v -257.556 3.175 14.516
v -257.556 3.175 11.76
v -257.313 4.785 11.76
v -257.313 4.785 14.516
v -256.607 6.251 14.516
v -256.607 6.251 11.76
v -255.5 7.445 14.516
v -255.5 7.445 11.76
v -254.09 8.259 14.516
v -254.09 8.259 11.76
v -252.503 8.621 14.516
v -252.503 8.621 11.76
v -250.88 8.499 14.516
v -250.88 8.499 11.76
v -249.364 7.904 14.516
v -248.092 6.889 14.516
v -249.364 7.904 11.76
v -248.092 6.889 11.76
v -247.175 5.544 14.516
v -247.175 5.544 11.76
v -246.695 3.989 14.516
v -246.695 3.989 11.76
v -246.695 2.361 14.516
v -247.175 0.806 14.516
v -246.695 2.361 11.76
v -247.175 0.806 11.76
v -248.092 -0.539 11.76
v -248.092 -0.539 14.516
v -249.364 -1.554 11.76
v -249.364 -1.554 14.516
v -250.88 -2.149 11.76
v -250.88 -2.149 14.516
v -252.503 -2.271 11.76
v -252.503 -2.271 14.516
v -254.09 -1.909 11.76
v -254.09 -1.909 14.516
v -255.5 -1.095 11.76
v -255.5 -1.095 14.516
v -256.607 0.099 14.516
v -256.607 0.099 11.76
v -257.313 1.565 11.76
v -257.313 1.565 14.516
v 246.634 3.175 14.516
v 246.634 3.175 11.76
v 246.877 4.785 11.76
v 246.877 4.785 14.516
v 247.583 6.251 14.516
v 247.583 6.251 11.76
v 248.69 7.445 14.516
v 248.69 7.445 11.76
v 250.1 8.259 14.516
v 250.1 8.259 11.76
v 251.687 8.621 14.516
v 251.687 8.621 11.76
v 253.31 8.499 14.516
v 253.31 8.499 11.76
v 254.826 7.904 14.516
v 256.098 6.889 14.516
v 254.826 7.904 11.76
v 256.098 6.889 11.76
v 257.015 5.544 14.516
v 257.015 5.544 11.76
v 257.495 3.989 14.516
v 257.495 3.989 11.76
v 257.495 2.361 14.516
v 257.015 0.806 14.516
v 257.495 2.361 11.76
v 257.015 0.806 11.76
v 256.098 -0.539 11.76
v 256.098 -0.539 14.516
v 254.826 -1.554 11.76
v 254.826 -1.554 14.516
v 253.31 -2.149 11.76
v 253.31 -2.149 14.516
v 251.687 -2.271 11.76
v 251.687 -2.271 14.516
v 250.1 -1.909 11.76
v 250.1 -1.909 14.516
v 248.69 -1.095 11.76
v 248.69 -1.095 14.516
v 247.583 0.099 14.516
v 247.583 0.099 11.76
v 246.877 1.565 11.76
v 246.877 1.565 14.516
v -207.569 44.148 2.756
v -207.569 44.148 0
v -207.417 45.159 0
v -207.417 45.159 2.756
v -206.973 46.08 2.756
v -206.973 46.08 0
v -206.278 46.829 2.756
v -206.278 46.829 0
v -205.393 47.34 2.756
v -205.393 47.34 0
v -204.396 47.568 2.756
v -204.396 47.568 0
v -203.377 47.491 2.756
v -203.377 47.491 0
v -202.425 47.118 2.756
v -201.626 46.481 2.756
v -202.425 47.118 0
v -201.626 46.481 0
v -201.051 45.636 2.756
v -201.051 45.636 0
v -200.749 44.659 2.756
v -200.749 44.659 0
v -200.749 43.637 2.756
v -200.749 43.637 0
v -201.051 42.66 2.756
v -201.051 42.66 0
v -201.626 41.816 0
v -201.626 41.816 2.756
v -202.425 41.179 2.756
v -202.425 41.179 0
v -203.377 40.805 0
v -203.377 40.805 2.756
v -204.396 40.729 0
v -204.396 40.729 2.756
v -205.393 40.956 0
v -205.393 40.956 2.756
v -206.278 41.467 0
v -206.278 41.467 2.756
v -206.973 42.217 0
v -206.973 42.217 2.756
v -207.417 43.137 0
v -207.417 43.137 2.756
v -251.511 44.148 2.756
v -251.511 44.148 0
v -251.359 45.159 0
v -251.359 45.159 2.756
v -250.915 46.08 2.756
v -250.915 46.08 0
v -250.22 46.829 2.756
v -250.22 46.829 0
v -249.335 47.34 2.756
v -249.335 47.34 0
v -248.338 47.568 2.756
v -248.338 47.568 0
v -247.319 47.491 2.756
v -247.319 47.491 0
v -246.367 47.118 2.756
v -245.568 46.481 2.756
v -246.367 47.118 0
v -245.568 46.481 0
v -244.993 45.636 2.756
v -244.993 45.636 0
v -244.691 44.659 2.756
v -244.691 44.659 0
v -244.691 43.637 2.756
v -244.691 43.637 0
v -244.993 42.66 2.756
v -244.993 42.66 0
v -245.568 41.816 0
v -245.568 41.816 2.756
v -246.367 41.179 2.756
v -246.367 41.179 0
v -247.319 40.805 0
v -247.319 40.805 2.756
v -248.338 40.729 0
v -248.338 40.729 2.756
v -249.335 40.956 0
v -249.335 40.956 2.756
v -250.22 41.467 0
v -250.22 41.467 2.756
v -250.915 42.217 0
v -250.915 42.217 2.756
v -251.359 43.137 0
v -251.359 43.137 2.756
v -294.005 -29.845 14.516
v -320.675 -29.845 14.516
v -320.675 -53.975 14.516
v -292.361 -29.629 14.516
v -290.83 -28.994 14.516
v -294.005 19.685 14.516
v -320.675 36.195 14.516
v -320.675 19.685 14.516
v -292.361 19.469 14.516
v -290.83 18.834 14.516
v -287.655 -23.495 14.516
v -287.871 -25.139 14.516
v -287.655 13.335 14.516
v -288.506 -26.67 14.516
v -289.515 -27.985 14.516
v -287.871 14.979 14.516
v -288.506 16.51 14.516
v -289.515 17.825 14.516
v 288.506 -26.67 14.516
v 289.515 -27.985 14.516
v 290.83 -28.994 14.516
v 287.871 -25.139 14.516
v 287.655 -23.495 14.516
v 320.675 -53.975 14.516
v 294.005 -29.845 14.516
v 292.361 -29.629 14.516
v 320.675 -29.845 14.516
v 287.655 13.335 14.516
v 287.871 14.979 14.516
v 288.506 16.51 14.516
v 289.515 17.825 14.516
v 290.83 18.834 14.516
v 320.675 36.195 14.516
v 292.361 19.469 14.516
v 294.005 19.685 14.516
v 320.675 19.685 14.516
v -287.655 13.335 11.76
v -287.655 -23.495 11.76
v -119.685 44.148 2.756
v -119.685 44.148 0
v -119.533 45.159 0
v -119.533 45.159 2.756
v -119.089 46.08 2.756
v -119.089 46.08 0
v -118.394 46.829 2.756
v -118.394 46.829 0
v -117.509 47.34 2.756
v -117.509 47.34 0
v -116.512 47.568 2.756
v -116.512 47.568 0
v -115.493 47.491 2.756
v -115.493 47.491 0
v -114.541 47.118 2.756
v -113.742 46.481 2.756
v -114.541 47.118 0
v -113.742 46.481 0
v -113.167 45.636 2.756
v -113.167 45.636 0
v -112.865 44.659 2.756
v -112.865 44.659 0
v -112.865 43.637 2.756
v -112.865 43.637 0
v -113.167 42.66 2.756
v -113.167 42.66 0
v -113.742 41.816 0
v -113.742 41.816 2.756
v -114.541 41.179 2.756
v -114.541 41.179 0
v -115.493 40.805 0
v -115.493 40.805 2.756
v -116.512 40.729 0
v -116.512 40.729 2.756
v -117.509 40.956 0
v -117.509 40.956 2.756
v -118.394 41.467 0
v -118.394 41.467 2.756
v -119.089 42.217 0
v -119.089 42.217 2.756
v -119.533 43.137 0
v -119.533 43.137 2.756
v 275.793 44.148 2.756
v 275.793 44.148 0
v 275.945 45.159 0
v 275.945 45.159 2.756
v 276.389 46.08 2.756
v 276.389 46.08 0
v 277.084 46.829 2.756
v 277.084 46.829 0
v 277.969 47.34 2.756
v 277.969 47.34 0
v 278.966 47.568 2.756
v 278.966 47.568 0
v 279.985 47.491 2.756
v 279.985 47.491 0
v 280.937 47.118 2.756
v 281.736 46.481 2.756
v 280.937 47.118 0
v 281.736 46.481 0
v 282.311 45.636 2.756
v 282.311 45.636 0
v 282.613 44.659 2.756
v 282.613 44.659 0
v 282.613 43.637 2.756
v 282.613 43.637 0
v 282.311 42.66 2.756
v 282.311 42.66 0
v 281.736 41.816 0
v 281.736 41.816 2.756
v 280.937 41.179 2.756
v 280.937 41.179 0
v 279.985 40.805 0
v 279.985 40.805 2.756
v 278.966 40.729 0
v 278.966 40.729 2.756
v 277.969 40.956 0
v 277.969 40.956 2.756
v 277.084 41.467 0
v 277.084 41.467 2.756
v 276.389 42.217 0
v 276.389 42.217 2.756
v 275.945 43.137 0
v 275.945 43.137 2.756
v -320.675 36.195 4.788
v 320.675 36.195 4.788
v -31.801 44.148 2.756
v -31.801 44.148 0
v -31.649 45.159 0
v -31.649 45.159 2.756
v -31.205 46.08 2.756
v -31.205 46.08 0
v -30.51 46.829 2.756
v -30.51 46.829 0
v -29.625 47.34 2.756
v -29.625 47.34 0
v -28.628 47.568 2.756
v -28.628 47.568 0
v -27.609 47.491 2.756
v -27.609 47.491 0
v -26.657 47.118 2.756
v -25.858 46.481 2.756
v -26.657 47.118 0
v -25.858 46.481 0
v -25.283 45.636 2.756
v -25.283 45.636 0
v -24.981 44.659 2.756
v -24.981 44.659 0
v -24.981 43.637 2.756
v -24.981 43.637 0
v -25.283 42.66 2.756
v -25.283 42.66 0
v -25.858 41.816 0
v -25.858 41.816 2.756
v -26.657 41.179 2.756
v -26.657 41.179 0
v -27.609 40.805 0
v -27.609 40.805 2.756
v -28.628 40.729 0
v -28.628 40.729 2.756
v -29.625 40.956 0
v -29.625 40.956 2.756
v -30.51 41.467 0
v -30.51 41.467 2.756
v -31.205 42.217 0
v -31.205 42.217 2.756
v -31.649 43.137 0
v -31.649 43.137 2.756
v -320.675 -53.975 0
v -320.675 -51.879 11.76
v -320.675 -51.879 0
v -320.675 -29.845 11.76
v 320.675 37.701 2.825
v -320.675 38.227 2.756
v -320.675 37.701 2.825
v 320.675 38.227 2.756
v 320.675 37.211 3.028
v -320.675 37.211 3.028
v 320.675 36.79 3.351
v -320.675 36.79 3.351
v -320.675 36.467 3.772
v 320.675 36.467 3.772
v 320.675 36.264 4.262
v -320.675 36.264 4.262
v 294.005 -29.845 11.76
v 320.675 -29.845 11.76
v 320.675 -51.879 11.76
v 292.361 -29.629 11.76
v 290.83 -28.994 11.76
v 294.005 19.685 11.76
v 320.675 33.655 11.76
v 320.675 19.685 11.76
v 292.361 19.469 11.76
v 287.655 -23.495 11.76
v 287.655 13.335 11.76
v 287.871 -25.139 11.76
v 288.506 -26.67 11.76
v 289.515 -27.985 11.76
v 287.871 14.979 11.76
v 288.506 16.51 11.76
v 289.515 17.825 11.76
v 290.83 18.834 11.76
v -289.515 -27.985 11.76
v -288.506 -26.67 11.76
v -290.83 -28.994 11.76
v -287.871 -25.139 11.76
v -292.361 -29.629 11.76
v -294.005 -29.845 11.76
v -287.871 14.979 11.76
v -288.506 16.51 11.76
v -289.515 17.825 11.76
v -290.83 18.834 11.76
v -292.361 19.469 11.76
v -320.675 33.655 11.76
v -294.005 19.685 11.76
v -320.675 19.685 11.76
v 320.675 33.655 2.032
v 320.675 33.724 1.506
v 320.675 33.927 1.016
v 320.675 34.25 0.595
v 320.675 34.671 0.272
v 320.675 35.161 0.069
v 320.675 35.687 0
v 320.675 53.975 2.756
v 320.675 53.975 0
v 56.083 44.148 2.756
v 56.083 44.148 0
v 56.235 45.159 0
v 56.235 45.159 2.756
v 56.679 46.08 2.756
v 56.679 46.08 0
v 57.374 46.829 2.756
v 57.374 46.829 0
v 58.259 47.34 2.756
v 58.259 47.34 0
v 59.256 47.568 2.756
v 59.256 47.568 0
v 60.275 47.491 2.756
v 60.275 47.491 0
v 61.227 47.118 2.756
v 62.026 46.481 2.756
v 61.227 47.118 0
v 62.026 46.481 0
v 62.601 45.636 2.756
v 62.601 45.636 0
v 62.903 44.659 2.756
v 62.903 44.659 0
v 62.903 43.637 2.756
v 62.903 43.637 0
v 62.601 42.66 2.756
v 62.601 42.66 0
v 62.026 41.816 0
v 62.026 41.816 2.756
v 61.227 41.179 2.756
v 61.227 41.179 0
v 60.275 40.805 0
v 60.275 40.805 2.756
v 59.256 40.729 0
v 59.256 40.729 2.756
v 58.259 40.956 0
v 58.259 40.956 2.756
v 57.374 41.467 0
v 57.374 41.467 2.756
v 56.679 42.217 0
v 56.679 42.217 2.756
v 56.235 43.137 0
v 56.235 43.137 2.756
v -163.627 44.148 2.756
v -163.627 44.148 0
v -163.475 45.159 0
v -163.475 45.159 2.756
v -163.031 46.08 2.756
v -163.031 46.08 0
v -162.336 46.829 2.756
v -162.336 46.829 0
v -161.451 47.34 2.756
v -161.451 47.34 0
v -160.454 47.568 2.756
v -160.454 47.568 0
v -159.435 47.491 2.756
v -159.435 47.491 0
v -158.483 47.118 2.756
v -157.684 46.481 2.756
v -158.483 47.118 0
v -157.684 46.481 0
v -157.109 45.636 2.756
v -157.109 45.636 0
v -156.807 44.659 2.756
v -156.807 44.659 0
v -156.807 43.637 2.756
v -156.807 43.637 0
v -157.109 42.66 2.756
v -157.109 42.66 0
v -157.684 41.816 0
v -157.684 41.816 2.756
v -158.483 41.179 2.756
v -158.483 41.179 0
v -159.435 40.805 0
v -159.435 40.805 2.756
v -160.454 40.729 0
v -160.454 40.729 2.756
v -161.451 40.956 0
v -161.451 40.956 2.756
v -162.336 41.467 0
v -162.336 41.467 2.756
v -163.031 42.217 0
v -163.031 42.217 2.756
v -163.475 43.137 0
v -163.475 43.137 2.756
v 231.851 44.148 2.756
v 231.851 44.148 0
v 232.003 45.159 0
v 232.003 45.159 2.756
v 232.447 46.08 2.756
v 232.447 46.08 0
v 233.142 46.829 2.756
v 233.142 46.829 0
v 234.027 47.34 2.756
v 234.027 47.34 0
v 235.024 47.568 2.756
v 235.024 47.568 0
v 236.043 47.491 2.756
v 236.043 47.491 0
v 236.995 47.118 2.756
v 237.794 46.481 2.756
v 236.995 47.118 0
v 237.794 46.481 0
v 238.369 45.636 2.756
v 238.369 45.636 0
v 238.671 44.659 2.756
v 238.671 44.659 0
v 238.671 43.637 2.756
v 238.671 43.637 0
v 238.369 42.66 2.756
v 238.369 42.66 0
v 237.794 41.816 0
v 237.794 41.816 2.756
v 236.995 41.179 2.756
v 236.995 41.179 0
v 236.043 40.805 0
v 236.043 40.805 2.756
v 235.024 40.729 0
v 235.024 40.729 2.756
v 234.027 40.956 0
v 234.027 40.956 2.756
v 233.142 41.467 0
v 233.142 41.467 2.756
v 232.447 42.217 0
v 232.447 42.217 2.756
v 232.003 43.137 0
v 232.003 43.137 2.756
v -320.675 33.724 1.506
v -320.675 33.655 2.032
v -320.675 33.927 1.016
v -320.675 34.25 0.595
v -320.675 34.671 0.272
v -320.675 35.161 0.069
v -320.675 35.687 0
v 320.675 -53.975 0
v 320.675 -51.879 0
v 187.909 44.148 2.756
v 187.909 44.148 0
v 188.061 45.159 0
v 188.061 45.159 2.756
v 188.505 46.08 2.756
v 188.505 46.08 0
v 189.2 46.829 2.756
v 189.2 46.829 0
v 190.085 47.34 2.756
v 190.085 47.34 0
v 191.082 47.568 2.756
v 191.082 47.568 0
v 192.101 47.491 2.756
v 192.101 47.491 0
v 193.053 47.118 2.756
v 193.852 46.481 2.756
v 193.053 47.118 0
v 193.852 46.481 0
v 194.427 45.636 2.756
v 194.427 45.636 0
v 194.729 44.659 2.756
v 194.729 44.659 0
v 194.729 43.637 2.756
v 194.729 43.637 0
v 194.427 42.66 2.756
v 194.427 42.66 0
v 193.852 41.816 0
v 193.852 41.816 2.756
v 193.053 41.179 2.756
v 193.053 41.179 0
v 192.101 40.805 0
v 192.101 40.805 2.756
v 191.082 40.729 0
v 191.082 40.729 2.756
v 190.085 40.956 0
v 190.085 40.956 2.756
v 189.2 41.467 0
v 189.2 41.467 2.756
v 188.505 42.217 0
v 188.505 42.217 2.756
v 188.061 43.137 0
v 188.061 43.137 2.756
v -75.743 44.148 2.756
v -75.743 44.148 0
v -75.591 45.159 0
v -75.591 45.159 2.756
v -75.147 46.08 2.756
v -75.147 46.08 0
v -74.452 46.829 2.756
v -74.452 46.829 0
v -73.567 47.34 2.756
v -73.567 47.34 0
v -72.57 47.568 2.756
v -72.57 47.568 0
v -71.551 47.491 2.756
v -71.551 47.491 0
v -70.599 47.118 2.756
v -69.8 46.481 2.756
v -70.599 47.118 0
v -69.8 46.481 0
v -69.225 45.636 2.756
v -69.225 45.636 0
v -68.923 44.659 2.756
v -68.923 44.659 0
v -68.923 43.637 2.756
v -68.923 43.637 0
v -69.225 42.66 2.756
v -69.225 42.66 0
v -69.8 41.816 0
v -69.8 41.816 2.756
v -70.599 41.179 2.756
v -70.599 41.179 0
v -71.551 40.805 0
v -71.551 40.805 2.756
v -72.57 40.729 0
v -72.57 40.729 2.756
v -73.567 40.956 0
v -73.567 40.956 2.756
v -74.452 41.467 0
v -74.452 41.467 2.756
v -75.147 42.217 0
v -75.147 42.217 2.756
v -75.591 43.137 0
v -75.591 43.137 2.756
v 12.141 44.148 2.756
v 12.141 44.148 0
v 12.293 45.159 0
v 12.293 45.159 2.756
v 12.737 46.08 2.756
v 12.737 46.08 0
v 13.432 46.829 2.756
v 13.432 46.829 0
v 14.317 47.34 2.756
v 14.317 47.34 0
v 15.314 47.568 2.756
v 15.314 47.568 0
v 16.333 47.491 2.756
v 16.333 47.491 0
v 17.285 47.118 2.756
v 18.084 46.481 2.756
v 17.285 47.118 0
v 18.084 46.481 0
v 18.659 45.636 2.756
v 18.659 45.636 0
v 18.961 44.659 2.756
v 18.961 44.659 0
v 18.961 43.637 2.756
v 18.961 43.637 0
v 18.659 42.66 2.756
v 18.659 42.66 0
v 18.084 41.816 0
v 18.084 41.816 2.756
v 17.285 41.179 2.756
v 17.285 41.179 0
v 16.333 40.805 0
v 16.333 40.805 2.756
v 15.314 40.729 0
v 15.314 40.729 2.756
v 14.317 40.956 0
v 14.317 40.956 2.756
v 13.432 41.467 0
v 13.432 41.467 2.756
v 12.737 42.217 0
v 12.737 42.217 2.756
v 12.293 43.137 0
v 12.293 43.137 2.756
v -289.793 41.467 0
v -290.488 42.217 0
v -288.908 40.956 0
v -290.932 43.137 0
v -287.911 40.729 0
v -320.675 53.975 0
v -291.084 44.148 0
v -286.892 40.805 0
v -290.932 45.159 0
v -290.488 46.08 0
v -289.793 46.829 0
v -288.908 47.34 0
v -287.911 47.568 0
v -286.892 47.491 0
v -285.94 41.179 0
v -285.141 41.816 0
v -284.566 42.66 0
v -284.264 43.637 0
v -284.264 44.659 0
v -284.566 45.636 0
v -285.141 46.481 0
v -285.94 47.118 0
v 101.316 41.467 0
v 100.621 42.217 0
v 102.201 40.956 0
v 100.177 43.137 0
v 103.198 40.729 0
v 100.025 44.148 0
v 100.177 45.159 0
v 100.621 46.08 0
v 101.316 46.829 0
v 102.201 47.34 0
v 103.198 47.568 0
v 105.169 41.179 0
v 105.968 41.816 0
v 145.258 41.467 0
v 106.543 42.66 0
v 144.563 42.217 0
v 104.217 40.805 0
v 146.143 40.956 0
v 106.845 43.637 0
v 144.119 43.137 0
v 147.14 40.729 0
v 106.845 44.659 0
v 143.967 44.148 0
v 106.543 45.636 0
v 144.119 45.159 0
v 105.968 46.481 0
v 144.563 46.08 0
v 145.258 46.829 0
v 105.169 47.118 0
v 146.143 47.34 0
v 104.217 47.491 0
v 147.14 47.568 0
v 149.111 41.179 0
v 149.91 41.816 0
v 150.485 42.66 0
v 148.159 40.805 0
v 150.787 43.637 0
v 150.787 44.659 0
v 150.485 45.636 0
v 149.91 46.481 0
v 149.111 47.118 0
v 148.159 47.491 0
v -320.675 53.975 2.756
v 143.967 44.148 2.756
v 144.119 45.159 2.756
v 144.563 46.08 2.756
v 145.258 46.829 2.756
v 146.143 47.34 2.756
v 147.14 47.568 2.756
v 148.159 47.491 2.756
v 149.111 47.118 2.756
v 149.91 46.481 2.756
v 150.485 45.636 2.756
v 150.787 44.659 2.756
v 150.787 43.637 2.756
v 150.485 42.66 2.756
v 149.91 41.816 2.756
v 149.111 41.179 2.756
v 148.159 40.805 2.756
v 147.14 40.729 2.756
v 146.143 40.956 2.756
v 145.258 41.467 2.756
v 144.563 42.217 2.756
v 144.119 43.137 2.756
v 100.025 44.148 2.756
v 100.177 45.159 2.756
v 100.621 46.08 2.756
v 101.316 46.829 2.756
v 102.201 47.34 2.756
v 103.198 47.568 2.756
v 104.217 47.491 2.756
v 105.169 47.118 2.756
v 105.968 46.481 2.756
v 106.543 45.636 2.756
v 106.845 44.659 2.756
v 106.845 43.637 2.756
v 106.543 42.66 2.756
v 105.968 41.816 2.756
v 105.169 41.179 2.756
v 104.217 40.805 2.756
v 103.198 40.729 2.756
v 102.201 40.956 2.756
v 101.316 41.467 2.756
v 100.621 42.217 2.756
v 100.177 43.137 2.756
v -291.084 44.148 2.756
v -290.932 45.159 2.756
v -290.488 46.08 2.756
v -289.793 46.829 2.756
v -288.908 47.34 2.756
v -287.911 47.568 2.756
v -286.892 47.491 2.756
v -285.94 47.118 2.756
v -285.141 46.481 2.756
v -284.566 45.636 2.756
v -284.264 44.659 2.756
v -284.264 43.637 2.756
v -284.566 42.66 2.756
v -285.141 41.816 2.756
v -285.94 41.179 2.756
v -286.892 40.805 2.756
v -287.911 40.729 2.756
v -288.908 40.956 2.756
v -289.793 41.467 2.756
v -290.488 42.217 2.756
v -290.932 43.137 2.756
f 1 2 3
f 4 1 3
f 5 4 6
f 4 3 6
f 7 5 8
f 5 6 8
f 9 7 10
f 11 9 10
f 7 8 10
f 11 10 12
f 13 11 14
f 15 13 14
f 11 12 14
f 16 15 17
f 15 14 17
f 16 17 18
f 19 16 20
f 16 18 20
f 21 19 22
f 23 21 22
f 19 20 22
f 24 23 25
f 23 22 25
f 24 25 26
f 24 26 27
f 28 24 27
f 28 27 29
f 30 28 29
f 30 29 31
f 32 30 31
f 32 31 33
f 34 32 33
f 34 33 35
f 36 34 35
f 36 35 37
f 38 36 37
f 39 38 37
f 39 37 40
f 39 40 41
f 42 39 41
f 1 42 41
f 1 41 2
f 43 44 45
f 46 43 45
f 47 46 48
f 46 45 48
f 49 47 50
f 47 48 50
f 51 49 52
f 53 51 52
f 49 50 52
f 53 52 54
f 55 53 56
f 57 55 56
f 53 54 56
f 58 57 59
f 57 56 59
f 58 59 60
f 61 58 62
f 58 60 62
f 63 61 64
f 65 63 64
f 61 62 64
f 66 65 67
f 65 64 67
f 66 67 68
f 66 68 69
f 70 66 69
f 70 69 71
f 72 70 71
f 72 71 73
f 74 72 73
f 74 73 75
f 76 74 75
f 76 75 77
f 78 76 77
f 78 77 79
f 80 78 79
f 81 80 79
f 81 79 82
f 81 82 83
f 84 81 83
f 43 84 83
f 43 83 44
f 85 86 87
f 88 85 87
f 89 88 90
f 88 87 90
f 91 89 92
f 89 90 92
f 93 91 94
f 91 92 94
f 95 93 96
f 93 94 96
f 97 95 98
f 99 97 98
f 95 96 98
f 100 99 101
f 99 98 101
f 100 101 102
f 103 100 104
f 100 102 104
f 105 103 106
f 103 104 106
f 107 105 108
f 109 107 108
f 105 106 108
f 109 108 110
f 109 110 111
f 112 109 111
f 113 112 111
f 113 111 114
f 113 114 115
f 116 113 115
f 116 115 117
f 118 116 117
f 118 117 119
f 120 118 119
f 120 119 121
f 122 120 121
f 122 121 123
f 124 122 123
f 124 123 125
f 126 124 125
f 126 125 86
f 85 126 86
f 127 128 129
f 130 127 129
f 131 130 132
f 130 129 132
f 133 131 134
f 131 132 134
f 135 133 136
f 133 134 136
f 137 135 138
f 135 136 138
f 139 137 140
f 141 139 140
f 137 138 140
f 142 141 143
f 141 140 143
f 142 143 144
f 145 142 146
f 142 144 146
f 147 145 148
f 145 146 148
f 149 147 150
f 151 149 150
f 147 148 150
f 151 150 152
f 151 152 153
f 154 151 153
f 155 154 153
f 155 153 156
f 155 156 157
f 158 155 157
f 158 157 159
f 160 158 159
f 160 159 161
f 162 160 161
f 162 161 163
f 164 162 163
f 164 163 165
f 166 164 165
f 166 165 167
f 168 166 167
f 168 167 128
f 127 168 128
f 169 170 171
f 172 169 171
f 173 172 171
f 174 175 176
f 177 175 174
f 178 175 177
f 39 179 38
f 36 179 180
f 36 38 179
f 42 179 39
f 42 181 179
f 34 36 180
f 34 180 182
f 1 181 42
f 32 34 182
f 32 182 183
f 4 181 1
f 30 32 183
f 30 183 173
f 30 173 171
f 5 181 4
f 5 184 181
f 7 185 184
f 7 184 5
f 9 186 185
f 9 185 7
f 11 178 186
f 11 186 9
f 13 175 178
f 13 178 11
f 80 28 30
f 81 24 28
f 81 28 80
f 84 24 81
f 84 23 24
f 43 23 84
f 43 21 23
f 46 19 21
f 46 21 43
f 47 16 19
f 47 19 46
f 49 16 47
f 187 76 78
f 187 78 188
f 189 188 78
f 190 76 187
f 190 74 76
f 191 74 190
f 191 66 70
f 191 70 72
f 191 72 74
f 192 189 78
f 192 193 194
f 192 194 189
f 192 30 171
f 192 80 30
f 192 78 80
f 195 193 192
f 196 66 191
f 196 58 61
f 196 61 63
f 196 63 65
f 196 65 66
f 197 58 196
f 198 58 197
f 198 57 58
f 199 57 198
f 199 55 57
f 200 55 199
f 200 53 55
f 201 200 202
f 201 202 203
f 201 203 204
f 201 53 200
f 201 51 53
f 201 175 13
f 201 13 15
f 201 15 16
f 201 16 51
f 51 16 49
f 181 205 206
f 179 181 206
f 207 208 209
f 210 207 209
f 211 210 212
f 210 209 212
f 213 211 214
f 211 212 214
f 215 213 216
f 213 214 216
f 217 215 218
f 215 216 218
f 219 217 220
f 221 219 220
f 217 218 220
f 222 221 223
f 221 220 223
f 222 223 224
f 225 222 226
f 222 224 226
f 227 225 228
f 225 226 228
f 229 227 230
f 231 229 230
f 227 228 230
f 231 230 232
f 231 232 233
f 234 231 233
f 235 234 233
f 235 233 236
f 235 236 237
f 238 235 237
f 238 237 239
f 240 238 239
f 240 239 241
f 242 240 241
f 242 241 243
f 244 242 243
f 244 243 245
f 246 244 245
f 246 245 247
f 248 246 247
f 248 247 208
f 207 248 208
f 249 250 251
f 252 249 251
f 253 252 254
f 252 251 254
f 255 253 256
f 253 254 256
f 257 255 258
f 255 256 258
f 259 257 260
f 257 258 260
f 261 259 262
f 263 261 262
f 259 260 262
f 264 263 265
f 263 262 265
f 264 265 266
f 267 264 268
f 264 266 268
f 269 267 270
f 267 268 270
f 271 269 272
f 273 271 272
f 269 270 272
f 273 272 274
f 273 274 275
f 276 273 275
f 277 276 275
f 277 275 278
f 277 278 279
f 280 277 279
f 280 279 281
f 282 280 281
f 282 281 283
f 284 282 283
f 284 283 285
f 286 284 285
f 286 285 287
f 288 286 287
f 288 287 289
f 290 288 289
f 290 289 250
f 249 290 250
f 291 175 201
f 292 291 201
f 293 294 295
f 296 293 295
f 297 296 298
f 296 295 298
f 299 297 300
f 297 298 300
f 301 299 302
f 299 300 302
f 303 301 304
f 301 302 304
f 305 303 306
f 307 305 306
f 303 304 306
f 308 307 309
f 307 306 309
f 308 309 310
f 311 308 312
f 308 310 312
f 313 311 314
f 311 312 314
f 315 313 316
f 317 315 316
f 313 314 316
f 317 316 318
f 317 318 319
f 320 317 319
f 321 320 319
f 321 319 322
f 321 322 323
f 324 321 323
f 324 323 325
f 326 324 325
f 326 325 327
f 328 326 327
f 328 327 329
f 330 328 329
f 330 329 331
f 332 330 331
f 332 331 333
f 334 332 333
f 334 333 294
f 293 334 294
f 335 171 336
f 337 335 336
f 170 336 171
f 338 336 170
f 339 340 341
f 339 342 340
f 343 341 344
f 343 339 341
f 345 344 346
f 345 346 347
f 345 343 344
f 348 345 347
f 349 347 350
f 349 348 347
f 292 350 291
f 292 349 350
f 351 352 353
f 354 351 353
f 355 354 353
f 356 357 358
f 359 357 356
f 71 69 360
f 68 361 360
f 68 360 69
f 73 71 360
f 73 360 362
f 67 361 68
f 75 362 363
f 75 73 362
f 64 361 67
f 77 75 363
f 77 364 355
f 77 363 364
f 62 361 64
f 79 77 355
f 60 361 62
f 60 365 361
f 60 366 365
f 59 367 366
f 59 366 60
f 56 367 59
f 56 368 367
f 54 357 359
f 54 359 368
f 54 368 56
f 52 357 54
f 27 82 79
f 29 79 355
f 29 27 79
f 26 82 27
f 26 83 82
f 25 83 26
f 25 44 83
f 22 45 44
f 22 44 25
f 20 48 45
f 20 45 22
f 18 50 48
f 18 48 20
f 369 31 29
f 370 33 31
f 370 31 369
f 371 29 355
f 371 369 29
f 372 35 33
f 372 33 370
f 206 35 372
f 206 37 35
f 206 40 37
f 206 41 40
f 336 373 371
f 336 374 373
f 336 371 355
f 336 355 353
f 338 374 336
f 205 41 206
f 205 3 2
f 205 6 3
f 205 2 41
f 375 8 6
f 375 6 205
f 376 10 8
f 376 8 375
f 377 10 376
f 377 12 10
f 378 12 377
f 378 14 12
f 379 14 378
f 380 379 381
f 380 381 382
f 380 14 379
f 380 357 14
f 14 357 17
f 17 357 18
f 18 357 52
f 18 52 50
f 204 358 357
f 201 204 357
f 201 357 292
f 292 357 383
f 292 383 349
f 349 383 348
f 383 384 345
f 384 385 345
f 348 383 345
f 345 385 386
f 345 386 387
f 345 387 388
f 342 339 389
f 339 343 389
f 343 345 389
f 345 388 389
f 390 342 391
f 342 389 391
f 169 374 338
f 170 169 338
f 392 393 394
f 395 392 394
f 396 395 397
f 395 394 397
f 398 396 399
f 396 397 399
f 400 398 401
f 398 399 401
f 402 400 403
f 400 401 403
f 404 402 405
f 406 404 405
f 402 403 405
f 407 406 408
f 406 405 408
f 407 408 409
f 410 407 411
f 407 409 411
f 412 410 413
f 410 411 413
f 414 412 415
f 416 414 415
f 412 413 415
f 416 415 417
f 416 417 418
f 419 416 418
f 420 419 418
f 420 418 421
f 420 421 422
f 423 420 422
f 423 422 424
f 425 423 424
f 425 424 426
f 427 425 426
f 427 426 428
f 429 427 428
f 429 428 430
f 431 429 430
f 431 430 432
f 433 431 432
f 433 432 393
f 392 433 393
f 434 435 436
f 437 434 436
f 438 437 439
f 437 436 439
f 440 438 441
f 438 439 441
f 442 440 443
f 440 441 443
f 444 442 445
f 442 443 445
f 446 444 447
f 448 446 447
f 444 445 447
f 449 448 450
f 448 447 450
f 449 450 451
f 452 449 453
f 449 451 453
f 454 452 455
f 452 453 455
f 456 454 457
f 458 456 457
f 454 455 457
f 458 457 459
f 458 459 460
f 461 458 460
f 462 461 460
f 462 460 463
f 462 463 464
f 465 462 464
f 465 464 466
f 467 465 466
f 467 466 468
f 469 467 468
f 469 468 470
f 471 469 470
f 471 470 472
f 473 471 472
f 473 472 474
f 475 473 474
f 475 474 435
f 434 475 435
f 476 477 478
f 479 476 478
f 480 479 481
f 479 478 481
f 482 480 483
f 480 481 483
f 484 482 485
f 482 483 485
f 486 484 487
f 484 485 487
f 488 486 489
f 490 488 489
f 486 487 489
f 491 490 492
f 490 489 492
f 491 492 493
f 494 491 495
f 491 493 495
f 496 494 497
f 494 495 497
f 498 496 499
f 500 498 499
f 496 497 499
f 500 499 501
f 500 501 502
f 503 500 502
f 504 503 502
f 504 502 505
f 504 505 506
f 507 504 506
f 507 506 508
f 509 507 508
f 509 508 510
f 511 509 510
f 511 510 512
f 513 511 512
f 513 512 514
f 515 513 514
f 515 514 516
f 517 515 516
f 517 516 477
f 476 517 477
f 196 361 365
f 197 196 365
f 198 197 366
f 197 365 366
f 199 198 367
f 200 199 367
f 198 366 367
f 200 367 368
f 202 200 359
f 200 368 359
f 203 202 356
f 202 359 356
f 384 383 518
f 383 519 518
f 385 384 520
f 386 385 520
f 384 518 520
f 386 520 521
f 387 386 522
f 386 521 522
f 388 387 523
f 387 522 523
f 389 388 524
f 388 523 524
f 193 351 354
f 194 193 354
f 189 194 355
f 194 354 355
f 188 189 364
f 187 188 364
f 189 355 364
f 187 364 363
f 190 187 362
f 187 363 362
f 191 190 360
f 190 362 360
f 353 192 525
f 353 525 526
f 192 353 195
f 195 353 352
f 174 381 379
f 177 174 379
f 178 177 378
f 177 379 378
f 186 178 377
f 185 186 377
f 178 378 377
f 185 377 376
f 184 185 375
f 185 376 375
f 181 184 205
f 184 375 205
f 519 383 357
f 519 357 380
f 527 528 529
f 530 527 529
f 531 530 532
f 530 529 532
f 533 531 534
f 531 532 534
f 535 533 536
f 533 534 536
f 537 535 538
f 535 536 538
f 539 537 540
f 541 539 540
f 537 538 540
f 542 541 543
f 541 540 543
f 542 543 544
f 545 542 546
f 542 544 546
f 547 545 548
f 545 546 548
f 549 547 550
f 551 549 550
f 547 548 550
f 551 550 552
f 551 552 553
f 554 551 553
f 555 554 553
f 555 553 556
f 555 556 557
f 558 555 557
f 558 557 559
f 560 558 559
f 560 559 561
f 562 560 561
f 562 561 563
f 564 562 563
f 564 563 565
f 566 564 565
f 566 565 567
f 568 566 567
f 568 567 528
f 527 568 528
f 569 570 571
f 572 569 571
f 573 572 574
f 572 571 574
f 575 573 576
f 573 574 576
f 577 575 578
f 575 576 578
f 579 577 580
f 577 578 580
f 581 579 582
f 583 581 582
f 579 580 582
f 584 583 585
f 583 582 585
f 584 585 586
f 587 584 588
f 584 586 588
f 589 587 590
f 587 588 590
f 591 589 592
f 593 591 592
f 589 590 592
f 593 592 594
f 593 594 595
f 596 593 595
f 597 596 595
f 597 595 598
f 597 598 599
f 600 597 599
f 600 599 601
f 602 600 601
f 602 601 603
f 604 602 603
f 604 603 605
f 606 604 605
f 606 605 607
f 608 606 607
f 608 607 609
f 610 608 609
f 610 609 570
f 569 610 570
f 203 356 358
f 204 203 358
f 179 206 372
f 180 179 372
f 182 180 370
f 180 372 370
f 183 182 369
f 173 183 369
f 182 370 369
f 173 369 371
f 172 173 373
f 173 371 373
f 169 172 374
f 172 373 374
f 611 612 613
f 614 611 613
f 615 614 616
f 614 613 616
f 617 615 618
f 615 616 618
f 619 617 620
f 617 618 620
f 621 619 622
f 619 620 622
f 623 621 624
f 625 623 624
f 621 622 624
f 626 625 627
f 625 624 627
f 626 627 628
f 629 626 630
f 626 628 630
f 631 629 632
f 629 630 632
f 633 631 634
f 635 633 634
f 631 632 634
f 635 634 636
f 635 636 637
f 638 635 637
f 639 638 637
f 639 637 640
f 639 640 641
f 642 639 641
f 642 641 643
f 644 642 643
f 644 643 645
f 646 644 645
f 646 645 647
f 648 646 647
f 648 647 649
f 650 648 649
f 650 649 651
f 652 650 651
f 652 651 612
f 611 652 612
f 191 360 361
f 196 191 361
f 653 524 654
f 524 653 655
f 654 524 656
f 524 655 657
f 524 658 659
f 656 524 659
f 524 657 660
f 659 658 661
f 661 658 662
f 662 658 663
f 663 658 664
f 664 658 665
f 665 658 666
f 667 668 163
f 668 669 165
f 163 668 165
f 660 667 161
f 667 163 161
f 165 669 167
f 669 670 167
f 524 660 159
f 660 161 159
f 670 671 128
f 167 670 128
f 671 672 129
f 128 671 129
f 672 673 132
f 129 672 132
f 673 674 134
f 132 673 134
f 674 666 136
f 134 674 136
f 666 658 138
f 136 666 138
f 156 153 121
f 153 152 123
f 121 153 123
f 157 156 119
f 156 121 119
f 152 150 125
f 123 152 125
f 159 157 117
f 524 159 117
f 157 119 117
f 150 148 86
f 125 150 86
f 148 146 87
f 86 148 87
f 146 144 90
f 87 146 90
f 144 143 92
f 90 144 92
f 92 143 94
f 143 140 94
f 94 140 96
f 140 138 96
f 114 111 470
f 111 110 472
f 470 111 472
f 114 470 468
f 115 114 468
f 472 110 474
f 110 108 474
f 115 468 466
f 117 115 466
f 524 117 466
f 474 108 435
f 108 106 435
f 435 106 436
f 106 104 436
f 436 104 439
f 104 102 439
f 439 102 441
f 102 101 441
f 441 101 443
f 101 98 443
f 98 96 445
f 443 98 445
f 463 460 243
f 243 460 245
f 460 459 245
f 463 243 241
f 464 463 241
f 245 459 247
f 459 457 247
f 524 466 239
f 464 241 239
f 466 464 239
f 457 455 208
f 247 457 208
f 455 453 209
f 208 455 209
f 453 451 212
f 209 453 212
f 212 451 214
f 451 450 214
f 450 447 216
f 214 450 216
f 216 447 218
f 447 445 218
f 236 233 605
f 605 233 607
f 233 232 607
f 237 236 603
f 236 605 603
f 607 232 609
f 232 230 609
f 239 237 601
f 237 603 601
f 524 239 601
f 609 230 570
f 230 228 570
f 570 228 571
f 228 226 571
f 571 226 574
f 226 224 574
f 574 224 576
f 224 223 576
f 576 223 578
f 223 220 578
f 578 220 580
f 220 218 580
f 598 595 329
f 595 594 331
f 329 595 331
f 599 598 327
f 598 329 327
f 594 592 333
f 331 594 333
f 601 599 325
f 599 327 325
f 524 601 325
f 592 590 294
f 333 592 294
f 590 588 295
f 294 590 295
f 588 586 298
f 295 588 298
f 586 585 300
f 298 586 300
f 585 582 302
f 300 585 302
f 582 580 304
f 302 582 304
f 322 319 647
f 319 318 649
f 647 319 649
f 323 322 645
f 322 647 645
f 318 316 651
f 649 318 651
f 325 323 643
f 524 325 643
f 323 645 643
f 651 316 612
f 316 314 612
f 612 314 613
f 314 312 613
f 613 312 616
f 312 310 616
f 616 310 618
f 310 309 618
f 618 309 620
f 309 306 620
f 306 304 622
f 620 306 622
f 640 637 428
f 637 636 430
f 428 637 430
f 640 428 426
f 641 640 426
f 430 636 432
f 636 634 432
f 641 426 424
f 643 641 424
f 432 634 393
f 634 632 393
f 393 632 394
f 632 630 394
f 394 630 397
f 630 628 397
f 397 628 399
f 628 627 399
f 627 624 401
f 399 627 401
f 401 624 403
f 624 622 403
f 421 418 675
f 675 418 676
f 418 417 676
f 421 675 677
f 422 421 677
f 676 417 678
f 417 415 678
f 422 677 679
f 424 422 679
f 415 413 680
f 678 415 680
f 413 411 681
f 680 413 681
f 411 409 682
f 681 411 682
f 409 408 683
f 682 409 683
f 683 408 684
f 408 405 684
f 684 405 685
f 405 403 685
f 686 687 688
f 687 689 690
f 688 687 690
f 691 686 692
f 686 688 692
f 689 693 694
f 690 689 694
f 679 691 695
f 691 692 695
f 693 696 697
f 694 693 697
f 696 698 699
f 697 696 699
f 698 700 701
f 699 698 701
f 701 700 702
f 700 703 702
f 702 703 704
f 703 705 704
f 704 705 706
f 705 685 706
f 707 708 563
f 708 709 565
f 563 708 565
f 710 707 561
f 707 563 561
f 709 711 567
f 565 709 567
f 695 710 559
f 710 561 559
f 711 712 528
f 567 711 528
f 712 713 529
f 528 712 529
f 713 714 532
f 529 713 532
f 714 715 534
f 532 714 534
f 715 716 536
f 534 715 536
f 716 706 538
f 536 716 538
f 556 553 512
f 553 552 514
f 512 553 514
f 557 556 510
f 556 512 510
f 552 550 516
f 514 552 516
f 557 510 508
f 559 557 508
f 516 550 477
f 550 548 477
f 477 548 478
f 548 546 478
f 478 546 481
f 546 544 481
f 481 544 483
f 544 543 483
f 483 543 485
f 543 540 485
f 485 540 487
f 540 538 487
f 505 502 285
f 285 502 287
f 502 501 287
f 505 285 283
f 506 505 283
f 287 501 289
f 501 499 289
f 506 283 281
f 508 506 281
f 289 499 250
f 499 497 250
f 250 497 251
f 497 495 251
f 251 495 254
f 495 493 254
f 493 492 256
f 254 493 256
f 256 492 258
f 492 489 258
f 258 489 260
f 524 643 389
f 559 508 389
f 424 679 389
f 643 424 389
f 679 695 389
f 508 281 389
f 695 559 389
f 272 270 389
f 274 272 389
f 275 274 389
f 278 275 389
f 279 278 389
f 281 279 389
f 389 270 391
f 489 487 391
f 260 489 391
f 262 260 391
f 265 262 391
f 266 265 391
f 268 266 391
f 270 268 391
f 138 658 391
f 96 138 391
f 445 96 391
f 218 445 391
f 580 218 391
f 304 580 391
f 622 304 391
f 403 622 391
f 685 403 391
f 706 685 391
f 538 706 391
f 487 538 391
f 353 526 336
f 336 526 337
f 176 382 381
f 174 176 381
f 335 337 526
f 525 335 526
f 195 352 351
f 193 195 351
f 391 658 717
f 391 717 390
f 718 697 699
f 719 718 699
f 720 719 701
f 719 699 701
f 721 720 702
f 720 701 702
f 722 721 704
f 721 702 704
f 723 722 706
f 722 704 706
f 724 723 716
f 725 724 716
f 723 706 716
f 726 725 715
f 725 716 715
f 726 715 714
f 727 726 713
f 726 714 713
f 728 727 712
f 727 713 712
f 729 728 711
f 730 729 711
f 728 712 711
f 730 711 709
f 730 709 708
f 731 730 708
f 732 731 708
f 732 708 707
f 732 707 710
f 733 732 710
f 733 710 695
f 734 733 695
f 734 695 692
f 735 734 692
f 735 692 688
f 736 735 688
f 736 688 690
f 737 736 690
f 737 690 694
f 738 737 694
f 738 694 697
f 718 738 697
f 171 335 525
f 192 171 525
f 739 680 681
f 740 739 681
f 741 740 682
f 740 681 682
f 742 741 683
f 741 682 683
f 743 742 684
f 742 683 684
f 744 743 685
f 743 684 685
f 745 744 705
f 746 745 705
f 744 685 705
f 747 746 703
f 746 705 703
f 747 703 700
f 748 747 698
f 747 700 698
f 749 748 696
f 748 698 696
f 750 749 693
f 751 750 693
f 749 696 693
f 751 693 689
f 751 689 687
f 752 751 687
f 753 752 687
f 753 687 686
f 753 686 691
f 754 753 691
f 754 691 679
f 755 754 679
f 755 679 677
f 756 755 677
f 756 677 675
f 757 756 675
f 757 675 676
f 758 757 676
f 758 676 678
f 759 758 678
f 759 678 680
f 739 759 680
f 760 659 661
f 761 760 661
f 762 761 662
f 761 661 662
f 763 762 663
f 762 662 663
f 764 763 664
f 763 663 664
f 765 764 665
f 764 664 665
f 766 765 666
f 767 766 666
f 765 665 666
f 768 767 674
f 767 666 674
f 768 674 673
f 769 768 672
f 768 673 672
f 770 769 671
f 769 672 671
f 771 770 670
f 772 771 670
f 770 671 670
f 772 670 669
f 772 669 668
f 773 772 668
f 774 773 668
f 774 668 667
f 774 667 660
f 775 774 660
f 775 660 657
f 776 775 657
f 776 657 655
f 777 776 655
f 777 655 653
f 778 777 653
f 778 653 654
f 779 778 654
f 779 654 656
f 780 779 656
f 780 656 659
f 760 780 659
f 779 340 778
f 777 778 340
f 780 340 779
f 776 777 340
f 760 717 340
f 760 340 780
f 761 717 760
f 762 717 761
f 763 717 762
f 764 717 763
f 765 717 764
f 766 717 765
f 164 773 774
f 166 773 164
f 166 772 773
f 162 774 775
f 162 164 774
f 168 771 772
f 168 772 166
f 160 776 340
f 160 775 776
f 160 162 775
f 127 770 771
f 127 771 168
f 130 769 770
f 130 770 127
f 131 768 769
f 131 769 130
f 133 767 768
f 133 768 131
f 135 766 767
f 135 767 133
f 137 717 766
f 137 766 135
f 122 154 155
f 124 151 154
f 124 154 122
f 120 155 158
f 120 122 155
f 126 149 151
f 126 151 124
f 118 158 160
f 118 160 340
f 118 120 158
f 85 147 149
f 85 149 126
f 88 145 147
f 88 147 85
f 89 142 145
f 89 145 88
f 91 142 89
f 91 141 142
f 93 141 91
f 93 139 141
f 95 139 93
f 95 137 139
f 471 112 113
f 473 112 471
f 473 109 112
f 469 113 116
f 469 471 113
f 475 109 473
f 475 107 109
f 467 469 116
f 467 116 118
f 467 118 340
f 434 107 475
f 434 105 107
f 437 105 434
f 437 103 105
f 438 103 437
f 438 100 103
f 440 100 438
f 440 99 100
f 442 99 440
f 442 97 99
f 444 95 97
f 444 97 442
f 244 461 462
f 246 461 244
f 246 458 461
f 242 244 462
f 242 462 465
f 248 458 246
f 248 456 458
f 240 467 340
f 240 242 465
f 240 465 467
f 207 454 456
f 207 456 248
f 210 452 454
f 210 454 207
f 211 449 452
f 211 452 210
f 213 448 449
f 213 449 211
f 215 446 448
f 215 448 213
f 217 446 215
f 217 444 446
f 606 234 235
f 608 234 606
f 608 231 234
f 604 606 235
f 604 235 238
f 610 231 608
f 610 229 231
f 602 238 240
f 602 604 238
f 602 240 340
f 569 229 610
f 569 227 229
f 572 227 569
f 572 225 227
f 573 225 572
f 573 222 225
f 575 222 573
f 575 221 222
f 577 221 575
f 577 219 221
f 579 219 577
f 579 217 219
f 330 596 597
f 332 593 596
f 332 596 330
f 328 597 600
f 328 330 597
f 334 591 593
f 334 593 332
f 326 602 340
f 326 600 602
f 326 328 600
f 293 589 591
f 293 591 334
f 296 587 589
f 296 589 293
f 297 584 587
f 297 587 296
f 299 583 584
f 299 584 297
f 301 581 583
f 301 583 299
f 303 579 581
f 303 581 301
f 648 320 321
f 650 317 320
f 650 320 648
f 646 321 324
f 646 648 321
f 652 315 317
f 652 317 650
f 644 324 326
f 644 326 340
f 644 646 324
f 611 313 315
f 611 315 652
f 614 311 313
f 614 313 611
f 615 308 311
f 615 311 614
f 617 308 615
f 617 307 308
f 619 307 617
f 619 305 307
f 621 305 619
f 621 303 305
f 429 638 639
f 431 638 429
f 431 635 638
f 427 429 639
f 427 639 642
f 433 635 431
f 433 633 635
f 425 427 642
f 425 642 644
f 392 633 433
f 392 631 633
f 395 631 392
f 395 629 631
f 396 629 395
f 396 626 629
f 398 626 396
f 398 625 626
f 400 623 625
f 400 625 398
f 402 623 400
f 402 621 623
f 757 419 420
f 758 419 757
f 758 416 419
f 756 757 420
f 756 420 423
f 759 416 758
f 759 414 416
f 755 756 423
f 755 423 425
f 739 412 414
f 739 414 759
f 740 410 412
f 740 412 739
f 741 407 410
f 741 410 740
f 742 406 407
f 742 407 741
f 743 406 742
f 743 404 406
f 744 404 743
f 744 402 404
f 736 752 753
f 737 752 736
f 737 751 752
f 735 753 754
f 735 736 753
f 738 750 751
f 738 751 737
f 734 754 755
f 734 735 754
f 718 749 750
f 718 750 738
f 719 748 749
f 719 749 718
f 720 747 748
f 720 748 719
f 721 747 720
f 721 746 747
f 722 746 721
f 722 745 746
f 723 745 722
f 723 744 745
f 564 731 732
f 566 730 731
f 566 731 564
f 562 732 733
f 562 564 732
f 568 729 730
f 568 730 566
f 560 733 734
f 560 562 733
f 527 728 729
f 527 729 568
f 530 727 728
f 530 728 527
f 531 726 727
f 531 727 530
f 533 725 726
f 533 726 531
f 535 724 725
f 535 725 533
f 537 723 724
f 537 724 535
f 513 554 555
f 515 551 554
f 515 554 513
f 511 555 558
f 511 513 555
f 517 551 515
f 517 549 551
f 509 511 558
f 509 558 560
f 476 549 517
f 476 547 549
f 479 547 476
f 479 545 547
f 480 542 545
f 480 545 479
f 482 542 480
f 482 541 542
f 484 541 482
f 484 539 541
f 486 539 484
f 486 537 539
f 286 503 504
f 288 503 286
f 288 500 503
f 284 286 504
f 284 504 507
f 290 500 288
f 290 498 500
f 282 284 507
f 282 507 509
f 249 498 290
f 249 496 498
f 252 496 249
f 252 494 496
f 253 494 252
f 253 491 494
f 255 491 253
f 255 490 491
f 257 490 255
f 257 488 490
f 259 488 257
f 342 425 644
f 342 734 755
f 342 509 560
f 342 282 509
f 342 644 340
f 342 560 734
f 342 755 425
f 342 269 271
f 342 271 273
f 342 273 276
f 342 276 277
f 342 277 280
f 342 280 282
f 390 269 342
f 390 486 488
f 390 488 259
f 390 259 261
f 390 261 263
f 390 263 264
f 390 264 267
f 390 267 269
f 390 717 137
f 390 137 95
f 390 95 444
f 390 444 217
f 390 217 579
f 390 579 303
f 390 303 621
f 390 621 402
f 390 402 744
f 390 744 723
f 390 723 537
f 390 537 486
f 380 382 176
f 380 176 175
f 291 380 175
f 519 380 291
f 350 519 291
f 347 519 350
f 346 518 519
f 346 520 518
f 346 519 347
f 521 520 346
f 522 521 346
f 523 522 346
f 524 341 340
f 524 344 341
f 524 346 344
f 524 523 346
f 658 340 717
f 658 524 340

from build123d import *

# Parameters (mm, degrees)
SKETCH1_W           = 641.35
SKETCH1_H           = 107.95
BOSS_EXTRUDE1_DEPTH = 14.5161
SKETCH2_W           = 641.35
SKETCH2_H           = 17.78
CUT_EXTRUDE1_DEPTH  = 11.7602
SKETCH3_W           = 641.35
SKETCH3_H           = 85.5345
CUT_EXTRUDE3_DEPTH  = 11.7602
FILLET1_R           = 2.032
CUT_EXTRUDE4_DEPTH  = 326.398307546
SKETCH5_R           = 3.429
CUT_EXTRUDE5_DEPTH  = 11.7602
SKETCH6_R           = 5.461
CUT_EXTRUDE6_DEPTH  = 11.7602


with BuildPart() as part:
    # Sketch1 → Boss-Extrude1 (new body)
    with BuildSketch(Plane.XY):
        Rectangle(SKETCH1_W, SKETCH1_H)
    extrude(amount=BOSS_EXTRUDE1_DEPTH)

    # Sketch2 → Cut-Extrude1 (cut)
    with BuildSketch(Plane.XY.offset(14.5161)):
        with Locations((0, 45.085)):
            Rectangle(SKETCH2_W, SKETCH2_H)
    extrude(amount=-CUT_EXTRUDE1_DEPTH, mode=Mode.SUBTRACT)

    # Sketch3 → Cut-Extrude3 (cut)
    with BuildSketch(Plane(origin=(0, 0, 0), x_dir=(-1, 0, 0), z_dir=(0, 0, -1))):
        with Locations((0, -9.11225)):
            Rectangle(SKETCH3_W, SKETCH3_H)
    extrude(amount=-CUT_EXTRUDE3_DEPTH, mode=Mode.SUBTRACT)

    # Fillet1
    fillet1_edges = [part.edges().sort_by_distance(p)[0] for p in [
        (0, 36.195, 2.7559),
        (0, 33.655, 0),
    ]]
    fillet(fillet1_edges, radius=FILLET1_R)

    # Sketch4 → Cut-Extrude4 (cut, through all)
    with BuildSketch(Plane(origin=(0, 0, 11.7602), x_dir=(-1, 0, 0), z_dir=(0, 0, -1))):
        with BuildLine():
            Line((-294.005, 19.685), (-320.675, 19.685))
            Line((-320.675, 19.685), (-320.675, -29.845))
            Line((-320.675, -29.845), (-294.005, -29.845))
            ThreePointArc((-294.005, -29.845), (-289.514871939, -27.985128061), (-287.655, -23.495))
            Line((-287.655, -23.495), (-287.655, 13.335))
            ThreePointArc((-287.655, 13.335), (-289.514871939, 17.825128061), (-294.005, 19.685))
        make_face()
        with BuildLine():
            Line((294.005, -29.845), (320.675, -29.845))
            Line((320.675, -29.845), (320.675, 19.685))
            Line((320.675, 19.685), (294.005, 19.685))
            ThreePointArc((294.005, 19.685), (289.514871939, 17.825128061), (287.655, 13.335))
            Line((287.655, 13.335), (287.655, -23.495))
            ThreePointArc((287.655, -23.495), (289.514871939, -27.985128061), (294.005, -29.845))
        make_face()
    extrude(amount=-CUT_EXTRUDE4_DEPTH, mode=Mode.SUBTRACT)

    # Sketch5 → Cut-Extrude5 (cut)
    with BuildSketch(Plane(origin=(0, 0, 0), x_dir=(-1, 0, 0), z_dir=(0, 0, -1))):
        with Locations((-279.222061941, 44.148206771)):
            Circle(SKETCH5_R)
        with Locations((-235.280061941, 44.148206771)):
            Circle(SKETCH5_R)
        with Locations((-191.338061941, 44.148206771)):
            Circle(SKETCH5_R)
        with Locations((-147.396061941, 44.148206771)):
            Circle(SKETCH5_R)
        with Locations((-103.454061941, 44.148206771)):
            Circle(SKETCH5_R)
        with Locations((-59.512061941, 44.148206771)):
            Circle(SKETCH5_R)
        with Locations((-15.570061941, 44.148206771)):
            Circle(SKETCH5_R)
        with Locations((28.371938059, 44.148206771)):
            Circle(SKETCH5_R)
        with Locations((72.313938059, 44.148206771)):
            Circle(SKETCH5_R)
        with Locations((116.255938059, 44.148206771)):
            Circle(SKETCH5_R)
        with Locations((160.197938059, 44.148206771)):
            Circle(SKETCH5_R)
        with Locations((204.139938059, 44.148206771)):
            Circle(SKETCH5_R)
        with Locations((248.081938059, 44.148206771)):
            Circle(SKETCH5_R)
        with Locations((287.655, 44.148206771)):
            Circle(SKETCH5_R)
    extrude(amount=-CUT_EXTRUDE5_DEPTH, mode=Mode.SUBTRACT)

    # Sketch6 → Cut-Extrude6 (cut)
    with BuildSketch(Plane(origin=(0, 0, 11.7602), x_dir=(-1, 0, 0), z_dir=(0, 0, -1))):
        with Locations((-252.095, 3.175)):
            Circle(SKETCH6_R)
        with Locations((252.095, 3.175)):
            Circle(SKETCH6_R)
    extrude(amount=-CUT_EXTRUDE6_DEPTH, mode=Mode.SUBTRACT)


solid = part.part
